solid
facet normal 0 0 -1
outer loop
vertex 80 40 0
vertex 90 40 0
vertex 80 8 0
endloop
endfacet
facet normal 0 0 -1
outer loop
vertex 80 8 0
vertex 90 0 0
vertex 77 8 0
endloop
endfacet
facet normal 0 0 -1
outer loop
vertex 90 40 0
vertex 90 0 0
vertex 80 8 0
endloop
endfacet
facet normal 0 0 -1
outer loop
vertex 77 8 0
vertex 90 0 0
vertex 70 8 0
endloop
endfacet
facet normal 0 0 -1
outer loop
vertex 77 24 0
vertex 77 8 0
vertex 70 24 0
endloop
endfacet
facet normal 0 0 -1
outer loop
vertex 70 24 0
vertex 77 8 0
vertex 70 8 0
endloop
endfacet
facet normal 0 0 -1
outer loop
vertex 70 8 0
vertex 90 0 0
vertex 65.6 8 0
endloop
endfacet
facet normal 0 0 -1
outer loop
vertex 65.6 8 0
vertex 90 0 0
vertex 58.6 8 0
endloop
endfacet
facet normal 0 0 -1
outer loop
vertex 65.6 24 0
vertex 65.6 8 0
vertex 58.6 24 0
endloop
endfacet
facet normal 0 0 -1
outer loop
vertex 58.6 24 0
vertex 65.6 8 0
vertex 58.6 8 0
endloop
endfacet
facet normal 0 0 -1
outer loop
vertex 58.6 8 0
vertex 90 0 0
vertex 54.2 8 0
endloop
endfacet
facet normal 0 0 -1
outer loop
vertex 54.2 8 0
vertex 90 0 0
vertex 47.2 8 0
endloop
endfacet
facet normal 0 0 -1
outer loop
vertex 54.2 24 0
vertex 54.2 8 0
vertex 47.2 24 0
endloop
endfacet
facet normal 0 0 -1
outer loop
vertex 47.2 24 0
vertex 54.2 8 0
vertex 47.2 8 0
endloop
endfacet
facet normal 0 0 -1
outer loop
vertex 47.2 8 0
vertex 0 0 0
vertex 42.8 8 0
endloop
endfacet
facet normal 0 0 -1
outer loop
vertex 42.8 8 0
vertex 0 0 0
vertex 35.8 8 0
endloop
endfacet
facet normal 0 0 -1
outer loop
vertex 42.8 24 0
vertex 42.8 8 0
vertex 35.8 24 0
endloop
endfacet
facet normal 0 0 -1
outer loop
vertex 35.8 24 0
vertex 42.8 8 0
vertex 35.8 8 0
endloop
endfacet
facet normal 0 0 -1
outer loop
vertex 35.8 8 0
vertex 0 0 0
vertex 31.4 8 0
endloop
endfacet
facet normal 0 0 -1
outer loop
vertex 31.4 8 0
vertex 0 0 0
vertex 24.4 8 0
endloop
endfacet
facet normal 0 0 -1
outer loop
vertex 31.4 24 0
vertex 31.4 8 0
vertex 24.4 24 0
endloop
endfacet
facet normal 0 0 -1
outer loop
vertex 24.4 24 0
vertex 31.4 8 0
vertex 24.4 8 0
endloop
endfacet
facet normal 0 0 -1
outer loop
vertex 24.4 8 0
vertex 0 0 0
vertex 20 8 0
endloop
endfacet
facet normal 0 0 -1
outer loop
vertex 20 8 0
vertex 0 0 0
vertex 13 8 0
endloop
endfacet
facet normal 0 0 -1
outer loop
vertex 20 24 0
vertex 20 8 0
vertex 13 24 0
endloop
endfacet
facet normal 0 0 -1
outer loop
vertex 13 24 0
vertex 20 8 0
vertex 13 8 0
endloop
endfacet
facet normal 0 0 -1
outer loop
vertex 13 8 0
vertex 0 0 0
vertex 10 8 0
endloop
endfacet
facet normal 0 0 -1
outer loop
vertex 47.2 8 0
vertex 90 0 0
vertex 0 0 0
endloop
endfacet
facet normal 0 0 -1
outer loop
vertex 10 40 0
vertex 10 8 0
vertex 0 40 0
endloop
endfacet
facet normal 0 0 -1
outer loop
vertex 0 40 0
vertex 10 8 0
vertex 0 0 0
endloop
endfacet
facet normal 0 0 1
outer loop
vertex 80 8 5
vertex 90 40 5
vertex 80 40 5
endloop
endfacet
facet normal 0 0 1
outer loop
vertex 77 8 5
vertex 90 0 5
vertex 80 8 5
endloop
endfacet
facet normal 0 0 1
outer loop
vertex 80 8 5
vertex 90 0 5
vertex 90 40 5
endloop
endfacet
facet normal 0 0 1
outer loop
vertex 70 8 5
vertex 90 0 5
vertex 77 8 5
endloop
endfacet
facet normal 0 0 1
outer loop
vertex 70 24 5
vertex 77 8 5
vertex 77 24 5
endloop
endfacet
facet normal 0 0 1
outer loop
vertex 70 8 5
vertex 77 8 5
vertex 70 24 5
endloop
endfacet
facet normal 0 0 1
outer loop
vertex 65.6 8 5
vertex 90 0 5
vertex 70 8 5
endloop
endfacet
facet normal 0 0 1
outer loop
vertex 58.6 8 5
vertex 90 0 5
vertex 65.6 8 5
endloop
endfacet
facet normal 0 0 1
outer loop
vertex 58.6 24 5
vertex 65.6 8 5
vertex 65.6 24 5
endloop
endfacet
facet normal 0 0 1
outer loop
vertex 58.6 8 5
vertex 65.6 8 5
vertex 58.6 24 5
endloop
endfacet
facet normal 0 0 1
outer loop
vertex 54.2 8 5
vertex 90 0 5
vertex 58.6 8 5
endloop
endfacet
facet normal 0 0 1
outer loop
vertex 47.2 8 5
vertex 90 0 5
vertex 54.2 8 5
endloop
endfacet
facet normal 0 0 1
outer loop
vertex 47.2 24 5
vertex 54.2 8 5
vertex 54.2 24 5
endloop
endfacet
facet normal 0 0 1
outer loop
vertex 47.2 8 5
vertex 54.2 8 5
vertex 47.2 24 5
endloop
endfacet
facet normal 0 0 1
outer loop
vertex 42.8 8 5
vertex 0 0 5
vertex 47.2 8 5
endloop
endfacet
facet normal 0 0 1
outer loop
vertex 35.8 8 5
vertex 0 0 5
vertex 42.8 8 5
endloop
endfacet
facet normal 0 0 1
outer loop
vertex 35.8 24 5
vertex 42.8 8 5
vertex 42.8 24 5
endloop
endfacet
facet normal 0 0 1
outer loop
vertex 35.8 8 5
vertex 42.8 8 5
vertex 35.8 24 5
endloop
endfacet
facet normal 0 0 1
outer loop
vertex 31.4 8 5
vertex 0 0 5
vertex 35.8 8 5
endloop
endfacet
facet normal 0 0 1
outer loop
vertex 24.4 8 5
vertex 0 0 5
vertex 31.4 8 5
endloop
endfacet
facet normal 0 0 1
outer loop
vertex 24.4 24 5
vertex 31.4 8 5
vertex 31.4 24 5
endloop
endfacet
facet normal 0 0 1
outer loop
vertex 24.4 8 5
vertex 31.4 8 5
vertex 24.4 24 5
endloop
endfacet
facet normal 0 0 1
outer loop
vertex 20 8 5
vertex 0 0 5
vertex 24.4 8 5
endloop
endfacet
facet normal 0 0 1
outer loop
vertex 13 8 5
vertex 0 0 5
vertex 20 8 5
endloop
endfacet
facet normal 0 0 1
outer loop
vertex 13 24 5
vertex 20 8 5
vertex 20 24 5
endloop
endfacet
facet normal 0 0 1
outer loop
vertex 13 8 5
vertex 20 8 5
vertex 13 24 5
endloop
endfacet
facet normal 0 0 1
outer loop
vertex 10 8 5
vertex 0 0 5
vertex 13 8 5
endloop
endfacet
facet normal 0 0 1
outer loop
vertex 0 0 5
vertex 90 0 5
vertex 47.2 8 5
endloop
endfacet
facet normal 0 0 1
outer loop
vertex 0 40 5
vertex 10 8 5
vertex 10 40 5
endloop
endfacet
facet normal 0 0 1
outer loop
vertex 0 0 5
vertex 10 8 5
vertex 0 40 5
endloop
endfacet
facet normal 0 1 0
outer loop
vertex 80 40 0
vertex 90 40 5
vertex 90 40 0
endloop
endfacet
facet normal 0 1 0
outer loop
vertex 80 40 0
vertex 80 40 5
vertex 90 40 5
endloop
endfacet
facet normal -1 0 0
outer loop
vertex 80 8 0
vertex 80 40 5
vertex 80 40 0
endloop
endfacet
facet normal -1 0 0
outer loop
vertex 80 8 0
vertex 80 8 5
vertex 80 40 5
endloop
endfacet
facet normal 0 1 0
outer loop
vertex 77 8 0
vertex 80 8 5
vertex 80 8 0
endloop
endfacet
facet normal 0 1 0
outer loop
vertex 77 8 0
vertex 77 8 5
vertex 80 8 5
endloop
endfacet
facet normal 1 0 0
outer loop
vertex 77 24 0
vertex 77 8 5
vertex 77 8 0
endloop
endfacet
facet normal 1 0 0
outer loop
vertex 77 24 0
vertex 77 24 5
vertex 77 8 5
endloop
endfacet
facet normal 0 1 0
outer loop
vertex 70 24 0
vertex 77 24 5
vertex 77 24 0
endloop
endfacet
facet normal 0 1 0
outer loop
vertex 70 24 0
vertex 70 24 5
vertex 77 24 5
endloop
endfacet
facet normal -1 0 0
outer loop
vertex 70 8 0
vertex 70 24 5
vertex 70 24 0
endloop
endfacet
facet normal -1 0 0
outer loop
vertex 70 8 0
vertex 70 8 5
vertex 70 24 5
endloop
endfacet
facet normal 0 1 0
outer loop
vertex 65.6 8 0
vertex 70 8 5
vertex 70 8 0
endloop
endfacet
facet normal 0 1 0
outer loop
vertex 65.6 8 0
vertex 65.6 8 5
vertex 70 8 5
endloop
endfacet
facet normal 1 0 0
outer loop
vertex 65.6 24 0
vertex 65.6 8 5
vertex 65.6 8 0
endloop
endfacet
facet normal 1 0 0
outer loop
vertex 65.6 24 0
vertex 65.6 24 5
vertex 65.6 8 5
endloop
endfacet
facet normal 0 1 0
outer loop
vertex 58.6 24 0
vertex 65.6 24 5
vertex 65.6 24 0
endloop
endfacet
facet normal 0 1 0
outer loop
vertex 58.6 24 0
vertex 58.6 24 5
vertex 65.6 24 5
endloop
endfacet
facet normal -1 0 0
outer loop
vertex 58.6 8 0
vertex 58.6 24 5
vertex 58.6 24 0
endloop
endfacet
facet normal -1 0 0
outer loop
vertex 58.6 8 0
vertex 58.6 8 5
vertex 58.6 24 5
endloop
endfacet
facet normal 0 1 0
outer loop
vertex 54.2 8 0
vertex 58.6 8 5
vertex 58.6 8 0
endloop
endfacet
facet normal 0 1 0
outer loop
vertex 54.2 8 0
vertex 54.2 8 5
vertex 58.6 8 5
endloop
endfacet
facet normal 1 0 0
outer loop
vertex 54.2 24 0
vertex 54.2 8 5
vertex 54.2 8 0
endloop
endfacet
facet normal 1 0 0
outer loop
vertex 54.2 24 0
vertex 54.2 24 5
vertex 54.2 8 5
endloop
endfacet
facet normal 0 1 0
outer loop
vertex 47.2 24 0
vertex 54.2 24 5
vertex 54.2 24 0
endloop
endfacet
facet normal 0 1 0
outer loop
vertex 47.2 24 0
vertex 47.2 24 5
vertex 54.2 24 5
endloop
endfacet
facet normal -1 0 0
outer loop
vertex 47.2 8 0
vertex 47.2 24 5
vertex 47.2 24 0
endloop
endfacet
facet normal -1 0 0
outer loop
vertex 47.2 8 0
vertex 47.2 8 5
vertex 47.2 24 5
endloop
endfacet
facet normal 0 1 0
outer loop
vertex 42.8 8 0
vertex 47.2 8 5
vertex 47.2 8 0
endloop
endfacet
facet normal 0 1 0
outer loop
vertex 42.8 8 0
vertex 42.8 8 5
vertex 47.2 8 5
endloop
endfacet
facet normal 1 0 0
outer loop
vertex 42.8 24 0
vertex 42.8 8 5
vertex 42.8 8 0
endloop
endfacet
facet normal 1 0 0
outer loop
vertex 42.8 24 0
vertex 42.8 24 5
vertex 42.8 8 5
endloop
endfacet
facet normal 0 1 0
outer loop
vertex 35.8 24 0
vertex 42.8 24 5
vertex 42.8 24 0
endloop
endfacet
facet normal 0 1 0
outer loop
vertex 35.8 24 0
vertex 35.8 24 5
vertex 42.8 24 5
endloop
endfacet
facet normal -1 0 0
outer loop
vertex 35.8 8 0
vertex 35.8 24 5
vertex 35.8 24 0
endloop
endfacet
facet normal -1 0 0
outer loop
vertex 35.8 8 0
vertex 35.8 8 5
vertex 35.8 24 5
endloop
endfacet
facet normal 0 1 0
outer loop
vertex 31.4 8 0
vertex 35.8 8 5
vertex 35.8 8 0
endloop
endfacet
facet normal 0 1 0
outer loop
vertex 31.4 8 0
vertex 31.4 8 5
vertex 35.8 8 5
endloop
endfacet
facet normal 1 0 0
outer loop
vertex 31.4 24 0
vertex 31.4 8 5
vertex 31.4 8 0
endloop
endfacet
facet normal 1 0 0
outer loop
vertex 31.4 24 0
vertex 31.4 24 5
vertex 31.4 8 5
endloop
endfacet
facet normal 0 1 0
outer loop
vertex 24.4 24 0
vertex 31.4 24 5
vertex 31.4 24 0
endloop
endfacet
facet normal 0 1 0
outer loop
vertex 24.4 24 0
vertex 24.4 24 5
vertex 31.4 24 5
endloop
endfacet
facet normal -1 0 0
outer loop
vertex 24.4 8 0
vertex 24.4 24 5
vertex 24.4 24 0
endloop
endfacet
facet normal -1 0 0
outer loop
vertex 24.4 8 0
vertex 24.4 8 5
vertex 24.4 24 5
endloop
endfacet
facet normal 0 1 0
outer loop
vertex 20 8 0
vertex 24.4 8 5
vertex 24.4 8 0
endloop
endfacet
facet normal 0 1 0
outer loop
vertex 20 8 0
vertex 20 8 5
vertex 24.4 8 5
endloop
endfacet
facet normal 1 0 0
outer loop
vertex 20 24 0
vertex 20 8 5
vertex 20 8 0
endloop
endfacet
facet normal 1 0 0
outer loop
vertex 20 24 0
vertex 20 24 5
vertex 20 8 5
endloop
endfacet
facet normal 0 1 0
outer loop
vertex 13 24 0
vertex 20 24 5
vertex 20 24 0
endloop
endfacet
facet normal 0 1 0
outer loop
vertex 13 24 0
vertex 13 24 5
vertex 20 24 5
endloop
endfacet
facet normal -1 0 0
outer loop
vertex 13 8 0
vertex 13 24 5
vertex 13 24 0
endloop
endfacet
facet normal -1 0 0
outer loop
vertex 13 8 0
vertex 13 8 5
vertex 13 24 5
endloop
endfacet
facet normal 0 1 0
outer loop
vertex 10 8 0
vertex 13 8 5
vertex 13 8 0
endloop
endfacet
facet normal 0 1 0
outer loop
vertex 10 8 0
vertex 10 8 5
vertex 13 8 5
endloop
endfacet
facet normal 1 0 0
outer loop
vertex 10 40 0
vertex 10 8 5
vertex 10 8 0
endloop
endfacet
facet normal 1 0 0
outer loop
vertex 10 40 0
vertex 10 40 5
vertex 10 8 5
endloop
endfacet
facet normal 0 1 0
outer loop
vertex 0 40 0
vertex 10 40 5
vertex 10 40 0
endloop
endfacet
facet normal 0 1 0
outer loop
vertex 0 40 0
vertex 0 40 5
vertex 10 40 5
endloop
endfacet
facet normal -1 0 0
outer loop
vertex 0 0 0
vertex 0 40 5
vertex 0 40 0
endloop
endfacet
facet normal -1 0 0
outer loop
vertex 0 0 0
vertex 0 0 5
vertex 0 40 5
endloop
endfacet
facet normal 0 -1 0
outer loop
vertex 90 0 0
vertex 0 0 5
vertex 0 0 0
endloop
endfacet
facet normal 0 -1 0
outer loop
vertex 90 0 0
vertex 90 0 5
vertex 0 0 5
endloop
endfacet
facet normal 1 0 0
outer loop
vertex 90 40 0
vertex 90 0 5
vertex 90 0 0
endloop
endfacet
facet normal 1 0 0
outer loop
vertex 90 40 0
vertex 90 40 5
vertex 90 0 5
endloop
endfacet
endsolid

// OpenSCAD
$fn = 32;

// ----------------------------------------------------------------------
// Guard grille: 6 slats over a 90 x 40 mm plate
// ----------------------------------------------------------------------

// --- parameters (mm) ---
profile_height = 5;       // extrusion height
profile_points = 32;      // points of the closed outline

profile = [[0, 0], [90, 0], [90, 40], [80, 40], [80, 8], [77, 8], [77, 24], [70, 24], [70, 8], [65.6, 8], [65.6, 24], [58.6, 24], [58.6, 8], [54.2, 8], [54.2, 24], [47.2, 24], [47.2, 8], [42.8, 8], [42.8, 24], [35.8, 24], [35.8, 8], [31.4, 8], [31.4, 24], [24.4, 24], [24.4, 8], [20, 8], [20, 24], [13, 24], [13, 8], [10, 8], [10, 40], [0, 40]];  // single closed polygon, 32 points, counter clockwise

// --- the one profile operation ---
linear_extrude(height = profile_height) polygon(points = profile);
